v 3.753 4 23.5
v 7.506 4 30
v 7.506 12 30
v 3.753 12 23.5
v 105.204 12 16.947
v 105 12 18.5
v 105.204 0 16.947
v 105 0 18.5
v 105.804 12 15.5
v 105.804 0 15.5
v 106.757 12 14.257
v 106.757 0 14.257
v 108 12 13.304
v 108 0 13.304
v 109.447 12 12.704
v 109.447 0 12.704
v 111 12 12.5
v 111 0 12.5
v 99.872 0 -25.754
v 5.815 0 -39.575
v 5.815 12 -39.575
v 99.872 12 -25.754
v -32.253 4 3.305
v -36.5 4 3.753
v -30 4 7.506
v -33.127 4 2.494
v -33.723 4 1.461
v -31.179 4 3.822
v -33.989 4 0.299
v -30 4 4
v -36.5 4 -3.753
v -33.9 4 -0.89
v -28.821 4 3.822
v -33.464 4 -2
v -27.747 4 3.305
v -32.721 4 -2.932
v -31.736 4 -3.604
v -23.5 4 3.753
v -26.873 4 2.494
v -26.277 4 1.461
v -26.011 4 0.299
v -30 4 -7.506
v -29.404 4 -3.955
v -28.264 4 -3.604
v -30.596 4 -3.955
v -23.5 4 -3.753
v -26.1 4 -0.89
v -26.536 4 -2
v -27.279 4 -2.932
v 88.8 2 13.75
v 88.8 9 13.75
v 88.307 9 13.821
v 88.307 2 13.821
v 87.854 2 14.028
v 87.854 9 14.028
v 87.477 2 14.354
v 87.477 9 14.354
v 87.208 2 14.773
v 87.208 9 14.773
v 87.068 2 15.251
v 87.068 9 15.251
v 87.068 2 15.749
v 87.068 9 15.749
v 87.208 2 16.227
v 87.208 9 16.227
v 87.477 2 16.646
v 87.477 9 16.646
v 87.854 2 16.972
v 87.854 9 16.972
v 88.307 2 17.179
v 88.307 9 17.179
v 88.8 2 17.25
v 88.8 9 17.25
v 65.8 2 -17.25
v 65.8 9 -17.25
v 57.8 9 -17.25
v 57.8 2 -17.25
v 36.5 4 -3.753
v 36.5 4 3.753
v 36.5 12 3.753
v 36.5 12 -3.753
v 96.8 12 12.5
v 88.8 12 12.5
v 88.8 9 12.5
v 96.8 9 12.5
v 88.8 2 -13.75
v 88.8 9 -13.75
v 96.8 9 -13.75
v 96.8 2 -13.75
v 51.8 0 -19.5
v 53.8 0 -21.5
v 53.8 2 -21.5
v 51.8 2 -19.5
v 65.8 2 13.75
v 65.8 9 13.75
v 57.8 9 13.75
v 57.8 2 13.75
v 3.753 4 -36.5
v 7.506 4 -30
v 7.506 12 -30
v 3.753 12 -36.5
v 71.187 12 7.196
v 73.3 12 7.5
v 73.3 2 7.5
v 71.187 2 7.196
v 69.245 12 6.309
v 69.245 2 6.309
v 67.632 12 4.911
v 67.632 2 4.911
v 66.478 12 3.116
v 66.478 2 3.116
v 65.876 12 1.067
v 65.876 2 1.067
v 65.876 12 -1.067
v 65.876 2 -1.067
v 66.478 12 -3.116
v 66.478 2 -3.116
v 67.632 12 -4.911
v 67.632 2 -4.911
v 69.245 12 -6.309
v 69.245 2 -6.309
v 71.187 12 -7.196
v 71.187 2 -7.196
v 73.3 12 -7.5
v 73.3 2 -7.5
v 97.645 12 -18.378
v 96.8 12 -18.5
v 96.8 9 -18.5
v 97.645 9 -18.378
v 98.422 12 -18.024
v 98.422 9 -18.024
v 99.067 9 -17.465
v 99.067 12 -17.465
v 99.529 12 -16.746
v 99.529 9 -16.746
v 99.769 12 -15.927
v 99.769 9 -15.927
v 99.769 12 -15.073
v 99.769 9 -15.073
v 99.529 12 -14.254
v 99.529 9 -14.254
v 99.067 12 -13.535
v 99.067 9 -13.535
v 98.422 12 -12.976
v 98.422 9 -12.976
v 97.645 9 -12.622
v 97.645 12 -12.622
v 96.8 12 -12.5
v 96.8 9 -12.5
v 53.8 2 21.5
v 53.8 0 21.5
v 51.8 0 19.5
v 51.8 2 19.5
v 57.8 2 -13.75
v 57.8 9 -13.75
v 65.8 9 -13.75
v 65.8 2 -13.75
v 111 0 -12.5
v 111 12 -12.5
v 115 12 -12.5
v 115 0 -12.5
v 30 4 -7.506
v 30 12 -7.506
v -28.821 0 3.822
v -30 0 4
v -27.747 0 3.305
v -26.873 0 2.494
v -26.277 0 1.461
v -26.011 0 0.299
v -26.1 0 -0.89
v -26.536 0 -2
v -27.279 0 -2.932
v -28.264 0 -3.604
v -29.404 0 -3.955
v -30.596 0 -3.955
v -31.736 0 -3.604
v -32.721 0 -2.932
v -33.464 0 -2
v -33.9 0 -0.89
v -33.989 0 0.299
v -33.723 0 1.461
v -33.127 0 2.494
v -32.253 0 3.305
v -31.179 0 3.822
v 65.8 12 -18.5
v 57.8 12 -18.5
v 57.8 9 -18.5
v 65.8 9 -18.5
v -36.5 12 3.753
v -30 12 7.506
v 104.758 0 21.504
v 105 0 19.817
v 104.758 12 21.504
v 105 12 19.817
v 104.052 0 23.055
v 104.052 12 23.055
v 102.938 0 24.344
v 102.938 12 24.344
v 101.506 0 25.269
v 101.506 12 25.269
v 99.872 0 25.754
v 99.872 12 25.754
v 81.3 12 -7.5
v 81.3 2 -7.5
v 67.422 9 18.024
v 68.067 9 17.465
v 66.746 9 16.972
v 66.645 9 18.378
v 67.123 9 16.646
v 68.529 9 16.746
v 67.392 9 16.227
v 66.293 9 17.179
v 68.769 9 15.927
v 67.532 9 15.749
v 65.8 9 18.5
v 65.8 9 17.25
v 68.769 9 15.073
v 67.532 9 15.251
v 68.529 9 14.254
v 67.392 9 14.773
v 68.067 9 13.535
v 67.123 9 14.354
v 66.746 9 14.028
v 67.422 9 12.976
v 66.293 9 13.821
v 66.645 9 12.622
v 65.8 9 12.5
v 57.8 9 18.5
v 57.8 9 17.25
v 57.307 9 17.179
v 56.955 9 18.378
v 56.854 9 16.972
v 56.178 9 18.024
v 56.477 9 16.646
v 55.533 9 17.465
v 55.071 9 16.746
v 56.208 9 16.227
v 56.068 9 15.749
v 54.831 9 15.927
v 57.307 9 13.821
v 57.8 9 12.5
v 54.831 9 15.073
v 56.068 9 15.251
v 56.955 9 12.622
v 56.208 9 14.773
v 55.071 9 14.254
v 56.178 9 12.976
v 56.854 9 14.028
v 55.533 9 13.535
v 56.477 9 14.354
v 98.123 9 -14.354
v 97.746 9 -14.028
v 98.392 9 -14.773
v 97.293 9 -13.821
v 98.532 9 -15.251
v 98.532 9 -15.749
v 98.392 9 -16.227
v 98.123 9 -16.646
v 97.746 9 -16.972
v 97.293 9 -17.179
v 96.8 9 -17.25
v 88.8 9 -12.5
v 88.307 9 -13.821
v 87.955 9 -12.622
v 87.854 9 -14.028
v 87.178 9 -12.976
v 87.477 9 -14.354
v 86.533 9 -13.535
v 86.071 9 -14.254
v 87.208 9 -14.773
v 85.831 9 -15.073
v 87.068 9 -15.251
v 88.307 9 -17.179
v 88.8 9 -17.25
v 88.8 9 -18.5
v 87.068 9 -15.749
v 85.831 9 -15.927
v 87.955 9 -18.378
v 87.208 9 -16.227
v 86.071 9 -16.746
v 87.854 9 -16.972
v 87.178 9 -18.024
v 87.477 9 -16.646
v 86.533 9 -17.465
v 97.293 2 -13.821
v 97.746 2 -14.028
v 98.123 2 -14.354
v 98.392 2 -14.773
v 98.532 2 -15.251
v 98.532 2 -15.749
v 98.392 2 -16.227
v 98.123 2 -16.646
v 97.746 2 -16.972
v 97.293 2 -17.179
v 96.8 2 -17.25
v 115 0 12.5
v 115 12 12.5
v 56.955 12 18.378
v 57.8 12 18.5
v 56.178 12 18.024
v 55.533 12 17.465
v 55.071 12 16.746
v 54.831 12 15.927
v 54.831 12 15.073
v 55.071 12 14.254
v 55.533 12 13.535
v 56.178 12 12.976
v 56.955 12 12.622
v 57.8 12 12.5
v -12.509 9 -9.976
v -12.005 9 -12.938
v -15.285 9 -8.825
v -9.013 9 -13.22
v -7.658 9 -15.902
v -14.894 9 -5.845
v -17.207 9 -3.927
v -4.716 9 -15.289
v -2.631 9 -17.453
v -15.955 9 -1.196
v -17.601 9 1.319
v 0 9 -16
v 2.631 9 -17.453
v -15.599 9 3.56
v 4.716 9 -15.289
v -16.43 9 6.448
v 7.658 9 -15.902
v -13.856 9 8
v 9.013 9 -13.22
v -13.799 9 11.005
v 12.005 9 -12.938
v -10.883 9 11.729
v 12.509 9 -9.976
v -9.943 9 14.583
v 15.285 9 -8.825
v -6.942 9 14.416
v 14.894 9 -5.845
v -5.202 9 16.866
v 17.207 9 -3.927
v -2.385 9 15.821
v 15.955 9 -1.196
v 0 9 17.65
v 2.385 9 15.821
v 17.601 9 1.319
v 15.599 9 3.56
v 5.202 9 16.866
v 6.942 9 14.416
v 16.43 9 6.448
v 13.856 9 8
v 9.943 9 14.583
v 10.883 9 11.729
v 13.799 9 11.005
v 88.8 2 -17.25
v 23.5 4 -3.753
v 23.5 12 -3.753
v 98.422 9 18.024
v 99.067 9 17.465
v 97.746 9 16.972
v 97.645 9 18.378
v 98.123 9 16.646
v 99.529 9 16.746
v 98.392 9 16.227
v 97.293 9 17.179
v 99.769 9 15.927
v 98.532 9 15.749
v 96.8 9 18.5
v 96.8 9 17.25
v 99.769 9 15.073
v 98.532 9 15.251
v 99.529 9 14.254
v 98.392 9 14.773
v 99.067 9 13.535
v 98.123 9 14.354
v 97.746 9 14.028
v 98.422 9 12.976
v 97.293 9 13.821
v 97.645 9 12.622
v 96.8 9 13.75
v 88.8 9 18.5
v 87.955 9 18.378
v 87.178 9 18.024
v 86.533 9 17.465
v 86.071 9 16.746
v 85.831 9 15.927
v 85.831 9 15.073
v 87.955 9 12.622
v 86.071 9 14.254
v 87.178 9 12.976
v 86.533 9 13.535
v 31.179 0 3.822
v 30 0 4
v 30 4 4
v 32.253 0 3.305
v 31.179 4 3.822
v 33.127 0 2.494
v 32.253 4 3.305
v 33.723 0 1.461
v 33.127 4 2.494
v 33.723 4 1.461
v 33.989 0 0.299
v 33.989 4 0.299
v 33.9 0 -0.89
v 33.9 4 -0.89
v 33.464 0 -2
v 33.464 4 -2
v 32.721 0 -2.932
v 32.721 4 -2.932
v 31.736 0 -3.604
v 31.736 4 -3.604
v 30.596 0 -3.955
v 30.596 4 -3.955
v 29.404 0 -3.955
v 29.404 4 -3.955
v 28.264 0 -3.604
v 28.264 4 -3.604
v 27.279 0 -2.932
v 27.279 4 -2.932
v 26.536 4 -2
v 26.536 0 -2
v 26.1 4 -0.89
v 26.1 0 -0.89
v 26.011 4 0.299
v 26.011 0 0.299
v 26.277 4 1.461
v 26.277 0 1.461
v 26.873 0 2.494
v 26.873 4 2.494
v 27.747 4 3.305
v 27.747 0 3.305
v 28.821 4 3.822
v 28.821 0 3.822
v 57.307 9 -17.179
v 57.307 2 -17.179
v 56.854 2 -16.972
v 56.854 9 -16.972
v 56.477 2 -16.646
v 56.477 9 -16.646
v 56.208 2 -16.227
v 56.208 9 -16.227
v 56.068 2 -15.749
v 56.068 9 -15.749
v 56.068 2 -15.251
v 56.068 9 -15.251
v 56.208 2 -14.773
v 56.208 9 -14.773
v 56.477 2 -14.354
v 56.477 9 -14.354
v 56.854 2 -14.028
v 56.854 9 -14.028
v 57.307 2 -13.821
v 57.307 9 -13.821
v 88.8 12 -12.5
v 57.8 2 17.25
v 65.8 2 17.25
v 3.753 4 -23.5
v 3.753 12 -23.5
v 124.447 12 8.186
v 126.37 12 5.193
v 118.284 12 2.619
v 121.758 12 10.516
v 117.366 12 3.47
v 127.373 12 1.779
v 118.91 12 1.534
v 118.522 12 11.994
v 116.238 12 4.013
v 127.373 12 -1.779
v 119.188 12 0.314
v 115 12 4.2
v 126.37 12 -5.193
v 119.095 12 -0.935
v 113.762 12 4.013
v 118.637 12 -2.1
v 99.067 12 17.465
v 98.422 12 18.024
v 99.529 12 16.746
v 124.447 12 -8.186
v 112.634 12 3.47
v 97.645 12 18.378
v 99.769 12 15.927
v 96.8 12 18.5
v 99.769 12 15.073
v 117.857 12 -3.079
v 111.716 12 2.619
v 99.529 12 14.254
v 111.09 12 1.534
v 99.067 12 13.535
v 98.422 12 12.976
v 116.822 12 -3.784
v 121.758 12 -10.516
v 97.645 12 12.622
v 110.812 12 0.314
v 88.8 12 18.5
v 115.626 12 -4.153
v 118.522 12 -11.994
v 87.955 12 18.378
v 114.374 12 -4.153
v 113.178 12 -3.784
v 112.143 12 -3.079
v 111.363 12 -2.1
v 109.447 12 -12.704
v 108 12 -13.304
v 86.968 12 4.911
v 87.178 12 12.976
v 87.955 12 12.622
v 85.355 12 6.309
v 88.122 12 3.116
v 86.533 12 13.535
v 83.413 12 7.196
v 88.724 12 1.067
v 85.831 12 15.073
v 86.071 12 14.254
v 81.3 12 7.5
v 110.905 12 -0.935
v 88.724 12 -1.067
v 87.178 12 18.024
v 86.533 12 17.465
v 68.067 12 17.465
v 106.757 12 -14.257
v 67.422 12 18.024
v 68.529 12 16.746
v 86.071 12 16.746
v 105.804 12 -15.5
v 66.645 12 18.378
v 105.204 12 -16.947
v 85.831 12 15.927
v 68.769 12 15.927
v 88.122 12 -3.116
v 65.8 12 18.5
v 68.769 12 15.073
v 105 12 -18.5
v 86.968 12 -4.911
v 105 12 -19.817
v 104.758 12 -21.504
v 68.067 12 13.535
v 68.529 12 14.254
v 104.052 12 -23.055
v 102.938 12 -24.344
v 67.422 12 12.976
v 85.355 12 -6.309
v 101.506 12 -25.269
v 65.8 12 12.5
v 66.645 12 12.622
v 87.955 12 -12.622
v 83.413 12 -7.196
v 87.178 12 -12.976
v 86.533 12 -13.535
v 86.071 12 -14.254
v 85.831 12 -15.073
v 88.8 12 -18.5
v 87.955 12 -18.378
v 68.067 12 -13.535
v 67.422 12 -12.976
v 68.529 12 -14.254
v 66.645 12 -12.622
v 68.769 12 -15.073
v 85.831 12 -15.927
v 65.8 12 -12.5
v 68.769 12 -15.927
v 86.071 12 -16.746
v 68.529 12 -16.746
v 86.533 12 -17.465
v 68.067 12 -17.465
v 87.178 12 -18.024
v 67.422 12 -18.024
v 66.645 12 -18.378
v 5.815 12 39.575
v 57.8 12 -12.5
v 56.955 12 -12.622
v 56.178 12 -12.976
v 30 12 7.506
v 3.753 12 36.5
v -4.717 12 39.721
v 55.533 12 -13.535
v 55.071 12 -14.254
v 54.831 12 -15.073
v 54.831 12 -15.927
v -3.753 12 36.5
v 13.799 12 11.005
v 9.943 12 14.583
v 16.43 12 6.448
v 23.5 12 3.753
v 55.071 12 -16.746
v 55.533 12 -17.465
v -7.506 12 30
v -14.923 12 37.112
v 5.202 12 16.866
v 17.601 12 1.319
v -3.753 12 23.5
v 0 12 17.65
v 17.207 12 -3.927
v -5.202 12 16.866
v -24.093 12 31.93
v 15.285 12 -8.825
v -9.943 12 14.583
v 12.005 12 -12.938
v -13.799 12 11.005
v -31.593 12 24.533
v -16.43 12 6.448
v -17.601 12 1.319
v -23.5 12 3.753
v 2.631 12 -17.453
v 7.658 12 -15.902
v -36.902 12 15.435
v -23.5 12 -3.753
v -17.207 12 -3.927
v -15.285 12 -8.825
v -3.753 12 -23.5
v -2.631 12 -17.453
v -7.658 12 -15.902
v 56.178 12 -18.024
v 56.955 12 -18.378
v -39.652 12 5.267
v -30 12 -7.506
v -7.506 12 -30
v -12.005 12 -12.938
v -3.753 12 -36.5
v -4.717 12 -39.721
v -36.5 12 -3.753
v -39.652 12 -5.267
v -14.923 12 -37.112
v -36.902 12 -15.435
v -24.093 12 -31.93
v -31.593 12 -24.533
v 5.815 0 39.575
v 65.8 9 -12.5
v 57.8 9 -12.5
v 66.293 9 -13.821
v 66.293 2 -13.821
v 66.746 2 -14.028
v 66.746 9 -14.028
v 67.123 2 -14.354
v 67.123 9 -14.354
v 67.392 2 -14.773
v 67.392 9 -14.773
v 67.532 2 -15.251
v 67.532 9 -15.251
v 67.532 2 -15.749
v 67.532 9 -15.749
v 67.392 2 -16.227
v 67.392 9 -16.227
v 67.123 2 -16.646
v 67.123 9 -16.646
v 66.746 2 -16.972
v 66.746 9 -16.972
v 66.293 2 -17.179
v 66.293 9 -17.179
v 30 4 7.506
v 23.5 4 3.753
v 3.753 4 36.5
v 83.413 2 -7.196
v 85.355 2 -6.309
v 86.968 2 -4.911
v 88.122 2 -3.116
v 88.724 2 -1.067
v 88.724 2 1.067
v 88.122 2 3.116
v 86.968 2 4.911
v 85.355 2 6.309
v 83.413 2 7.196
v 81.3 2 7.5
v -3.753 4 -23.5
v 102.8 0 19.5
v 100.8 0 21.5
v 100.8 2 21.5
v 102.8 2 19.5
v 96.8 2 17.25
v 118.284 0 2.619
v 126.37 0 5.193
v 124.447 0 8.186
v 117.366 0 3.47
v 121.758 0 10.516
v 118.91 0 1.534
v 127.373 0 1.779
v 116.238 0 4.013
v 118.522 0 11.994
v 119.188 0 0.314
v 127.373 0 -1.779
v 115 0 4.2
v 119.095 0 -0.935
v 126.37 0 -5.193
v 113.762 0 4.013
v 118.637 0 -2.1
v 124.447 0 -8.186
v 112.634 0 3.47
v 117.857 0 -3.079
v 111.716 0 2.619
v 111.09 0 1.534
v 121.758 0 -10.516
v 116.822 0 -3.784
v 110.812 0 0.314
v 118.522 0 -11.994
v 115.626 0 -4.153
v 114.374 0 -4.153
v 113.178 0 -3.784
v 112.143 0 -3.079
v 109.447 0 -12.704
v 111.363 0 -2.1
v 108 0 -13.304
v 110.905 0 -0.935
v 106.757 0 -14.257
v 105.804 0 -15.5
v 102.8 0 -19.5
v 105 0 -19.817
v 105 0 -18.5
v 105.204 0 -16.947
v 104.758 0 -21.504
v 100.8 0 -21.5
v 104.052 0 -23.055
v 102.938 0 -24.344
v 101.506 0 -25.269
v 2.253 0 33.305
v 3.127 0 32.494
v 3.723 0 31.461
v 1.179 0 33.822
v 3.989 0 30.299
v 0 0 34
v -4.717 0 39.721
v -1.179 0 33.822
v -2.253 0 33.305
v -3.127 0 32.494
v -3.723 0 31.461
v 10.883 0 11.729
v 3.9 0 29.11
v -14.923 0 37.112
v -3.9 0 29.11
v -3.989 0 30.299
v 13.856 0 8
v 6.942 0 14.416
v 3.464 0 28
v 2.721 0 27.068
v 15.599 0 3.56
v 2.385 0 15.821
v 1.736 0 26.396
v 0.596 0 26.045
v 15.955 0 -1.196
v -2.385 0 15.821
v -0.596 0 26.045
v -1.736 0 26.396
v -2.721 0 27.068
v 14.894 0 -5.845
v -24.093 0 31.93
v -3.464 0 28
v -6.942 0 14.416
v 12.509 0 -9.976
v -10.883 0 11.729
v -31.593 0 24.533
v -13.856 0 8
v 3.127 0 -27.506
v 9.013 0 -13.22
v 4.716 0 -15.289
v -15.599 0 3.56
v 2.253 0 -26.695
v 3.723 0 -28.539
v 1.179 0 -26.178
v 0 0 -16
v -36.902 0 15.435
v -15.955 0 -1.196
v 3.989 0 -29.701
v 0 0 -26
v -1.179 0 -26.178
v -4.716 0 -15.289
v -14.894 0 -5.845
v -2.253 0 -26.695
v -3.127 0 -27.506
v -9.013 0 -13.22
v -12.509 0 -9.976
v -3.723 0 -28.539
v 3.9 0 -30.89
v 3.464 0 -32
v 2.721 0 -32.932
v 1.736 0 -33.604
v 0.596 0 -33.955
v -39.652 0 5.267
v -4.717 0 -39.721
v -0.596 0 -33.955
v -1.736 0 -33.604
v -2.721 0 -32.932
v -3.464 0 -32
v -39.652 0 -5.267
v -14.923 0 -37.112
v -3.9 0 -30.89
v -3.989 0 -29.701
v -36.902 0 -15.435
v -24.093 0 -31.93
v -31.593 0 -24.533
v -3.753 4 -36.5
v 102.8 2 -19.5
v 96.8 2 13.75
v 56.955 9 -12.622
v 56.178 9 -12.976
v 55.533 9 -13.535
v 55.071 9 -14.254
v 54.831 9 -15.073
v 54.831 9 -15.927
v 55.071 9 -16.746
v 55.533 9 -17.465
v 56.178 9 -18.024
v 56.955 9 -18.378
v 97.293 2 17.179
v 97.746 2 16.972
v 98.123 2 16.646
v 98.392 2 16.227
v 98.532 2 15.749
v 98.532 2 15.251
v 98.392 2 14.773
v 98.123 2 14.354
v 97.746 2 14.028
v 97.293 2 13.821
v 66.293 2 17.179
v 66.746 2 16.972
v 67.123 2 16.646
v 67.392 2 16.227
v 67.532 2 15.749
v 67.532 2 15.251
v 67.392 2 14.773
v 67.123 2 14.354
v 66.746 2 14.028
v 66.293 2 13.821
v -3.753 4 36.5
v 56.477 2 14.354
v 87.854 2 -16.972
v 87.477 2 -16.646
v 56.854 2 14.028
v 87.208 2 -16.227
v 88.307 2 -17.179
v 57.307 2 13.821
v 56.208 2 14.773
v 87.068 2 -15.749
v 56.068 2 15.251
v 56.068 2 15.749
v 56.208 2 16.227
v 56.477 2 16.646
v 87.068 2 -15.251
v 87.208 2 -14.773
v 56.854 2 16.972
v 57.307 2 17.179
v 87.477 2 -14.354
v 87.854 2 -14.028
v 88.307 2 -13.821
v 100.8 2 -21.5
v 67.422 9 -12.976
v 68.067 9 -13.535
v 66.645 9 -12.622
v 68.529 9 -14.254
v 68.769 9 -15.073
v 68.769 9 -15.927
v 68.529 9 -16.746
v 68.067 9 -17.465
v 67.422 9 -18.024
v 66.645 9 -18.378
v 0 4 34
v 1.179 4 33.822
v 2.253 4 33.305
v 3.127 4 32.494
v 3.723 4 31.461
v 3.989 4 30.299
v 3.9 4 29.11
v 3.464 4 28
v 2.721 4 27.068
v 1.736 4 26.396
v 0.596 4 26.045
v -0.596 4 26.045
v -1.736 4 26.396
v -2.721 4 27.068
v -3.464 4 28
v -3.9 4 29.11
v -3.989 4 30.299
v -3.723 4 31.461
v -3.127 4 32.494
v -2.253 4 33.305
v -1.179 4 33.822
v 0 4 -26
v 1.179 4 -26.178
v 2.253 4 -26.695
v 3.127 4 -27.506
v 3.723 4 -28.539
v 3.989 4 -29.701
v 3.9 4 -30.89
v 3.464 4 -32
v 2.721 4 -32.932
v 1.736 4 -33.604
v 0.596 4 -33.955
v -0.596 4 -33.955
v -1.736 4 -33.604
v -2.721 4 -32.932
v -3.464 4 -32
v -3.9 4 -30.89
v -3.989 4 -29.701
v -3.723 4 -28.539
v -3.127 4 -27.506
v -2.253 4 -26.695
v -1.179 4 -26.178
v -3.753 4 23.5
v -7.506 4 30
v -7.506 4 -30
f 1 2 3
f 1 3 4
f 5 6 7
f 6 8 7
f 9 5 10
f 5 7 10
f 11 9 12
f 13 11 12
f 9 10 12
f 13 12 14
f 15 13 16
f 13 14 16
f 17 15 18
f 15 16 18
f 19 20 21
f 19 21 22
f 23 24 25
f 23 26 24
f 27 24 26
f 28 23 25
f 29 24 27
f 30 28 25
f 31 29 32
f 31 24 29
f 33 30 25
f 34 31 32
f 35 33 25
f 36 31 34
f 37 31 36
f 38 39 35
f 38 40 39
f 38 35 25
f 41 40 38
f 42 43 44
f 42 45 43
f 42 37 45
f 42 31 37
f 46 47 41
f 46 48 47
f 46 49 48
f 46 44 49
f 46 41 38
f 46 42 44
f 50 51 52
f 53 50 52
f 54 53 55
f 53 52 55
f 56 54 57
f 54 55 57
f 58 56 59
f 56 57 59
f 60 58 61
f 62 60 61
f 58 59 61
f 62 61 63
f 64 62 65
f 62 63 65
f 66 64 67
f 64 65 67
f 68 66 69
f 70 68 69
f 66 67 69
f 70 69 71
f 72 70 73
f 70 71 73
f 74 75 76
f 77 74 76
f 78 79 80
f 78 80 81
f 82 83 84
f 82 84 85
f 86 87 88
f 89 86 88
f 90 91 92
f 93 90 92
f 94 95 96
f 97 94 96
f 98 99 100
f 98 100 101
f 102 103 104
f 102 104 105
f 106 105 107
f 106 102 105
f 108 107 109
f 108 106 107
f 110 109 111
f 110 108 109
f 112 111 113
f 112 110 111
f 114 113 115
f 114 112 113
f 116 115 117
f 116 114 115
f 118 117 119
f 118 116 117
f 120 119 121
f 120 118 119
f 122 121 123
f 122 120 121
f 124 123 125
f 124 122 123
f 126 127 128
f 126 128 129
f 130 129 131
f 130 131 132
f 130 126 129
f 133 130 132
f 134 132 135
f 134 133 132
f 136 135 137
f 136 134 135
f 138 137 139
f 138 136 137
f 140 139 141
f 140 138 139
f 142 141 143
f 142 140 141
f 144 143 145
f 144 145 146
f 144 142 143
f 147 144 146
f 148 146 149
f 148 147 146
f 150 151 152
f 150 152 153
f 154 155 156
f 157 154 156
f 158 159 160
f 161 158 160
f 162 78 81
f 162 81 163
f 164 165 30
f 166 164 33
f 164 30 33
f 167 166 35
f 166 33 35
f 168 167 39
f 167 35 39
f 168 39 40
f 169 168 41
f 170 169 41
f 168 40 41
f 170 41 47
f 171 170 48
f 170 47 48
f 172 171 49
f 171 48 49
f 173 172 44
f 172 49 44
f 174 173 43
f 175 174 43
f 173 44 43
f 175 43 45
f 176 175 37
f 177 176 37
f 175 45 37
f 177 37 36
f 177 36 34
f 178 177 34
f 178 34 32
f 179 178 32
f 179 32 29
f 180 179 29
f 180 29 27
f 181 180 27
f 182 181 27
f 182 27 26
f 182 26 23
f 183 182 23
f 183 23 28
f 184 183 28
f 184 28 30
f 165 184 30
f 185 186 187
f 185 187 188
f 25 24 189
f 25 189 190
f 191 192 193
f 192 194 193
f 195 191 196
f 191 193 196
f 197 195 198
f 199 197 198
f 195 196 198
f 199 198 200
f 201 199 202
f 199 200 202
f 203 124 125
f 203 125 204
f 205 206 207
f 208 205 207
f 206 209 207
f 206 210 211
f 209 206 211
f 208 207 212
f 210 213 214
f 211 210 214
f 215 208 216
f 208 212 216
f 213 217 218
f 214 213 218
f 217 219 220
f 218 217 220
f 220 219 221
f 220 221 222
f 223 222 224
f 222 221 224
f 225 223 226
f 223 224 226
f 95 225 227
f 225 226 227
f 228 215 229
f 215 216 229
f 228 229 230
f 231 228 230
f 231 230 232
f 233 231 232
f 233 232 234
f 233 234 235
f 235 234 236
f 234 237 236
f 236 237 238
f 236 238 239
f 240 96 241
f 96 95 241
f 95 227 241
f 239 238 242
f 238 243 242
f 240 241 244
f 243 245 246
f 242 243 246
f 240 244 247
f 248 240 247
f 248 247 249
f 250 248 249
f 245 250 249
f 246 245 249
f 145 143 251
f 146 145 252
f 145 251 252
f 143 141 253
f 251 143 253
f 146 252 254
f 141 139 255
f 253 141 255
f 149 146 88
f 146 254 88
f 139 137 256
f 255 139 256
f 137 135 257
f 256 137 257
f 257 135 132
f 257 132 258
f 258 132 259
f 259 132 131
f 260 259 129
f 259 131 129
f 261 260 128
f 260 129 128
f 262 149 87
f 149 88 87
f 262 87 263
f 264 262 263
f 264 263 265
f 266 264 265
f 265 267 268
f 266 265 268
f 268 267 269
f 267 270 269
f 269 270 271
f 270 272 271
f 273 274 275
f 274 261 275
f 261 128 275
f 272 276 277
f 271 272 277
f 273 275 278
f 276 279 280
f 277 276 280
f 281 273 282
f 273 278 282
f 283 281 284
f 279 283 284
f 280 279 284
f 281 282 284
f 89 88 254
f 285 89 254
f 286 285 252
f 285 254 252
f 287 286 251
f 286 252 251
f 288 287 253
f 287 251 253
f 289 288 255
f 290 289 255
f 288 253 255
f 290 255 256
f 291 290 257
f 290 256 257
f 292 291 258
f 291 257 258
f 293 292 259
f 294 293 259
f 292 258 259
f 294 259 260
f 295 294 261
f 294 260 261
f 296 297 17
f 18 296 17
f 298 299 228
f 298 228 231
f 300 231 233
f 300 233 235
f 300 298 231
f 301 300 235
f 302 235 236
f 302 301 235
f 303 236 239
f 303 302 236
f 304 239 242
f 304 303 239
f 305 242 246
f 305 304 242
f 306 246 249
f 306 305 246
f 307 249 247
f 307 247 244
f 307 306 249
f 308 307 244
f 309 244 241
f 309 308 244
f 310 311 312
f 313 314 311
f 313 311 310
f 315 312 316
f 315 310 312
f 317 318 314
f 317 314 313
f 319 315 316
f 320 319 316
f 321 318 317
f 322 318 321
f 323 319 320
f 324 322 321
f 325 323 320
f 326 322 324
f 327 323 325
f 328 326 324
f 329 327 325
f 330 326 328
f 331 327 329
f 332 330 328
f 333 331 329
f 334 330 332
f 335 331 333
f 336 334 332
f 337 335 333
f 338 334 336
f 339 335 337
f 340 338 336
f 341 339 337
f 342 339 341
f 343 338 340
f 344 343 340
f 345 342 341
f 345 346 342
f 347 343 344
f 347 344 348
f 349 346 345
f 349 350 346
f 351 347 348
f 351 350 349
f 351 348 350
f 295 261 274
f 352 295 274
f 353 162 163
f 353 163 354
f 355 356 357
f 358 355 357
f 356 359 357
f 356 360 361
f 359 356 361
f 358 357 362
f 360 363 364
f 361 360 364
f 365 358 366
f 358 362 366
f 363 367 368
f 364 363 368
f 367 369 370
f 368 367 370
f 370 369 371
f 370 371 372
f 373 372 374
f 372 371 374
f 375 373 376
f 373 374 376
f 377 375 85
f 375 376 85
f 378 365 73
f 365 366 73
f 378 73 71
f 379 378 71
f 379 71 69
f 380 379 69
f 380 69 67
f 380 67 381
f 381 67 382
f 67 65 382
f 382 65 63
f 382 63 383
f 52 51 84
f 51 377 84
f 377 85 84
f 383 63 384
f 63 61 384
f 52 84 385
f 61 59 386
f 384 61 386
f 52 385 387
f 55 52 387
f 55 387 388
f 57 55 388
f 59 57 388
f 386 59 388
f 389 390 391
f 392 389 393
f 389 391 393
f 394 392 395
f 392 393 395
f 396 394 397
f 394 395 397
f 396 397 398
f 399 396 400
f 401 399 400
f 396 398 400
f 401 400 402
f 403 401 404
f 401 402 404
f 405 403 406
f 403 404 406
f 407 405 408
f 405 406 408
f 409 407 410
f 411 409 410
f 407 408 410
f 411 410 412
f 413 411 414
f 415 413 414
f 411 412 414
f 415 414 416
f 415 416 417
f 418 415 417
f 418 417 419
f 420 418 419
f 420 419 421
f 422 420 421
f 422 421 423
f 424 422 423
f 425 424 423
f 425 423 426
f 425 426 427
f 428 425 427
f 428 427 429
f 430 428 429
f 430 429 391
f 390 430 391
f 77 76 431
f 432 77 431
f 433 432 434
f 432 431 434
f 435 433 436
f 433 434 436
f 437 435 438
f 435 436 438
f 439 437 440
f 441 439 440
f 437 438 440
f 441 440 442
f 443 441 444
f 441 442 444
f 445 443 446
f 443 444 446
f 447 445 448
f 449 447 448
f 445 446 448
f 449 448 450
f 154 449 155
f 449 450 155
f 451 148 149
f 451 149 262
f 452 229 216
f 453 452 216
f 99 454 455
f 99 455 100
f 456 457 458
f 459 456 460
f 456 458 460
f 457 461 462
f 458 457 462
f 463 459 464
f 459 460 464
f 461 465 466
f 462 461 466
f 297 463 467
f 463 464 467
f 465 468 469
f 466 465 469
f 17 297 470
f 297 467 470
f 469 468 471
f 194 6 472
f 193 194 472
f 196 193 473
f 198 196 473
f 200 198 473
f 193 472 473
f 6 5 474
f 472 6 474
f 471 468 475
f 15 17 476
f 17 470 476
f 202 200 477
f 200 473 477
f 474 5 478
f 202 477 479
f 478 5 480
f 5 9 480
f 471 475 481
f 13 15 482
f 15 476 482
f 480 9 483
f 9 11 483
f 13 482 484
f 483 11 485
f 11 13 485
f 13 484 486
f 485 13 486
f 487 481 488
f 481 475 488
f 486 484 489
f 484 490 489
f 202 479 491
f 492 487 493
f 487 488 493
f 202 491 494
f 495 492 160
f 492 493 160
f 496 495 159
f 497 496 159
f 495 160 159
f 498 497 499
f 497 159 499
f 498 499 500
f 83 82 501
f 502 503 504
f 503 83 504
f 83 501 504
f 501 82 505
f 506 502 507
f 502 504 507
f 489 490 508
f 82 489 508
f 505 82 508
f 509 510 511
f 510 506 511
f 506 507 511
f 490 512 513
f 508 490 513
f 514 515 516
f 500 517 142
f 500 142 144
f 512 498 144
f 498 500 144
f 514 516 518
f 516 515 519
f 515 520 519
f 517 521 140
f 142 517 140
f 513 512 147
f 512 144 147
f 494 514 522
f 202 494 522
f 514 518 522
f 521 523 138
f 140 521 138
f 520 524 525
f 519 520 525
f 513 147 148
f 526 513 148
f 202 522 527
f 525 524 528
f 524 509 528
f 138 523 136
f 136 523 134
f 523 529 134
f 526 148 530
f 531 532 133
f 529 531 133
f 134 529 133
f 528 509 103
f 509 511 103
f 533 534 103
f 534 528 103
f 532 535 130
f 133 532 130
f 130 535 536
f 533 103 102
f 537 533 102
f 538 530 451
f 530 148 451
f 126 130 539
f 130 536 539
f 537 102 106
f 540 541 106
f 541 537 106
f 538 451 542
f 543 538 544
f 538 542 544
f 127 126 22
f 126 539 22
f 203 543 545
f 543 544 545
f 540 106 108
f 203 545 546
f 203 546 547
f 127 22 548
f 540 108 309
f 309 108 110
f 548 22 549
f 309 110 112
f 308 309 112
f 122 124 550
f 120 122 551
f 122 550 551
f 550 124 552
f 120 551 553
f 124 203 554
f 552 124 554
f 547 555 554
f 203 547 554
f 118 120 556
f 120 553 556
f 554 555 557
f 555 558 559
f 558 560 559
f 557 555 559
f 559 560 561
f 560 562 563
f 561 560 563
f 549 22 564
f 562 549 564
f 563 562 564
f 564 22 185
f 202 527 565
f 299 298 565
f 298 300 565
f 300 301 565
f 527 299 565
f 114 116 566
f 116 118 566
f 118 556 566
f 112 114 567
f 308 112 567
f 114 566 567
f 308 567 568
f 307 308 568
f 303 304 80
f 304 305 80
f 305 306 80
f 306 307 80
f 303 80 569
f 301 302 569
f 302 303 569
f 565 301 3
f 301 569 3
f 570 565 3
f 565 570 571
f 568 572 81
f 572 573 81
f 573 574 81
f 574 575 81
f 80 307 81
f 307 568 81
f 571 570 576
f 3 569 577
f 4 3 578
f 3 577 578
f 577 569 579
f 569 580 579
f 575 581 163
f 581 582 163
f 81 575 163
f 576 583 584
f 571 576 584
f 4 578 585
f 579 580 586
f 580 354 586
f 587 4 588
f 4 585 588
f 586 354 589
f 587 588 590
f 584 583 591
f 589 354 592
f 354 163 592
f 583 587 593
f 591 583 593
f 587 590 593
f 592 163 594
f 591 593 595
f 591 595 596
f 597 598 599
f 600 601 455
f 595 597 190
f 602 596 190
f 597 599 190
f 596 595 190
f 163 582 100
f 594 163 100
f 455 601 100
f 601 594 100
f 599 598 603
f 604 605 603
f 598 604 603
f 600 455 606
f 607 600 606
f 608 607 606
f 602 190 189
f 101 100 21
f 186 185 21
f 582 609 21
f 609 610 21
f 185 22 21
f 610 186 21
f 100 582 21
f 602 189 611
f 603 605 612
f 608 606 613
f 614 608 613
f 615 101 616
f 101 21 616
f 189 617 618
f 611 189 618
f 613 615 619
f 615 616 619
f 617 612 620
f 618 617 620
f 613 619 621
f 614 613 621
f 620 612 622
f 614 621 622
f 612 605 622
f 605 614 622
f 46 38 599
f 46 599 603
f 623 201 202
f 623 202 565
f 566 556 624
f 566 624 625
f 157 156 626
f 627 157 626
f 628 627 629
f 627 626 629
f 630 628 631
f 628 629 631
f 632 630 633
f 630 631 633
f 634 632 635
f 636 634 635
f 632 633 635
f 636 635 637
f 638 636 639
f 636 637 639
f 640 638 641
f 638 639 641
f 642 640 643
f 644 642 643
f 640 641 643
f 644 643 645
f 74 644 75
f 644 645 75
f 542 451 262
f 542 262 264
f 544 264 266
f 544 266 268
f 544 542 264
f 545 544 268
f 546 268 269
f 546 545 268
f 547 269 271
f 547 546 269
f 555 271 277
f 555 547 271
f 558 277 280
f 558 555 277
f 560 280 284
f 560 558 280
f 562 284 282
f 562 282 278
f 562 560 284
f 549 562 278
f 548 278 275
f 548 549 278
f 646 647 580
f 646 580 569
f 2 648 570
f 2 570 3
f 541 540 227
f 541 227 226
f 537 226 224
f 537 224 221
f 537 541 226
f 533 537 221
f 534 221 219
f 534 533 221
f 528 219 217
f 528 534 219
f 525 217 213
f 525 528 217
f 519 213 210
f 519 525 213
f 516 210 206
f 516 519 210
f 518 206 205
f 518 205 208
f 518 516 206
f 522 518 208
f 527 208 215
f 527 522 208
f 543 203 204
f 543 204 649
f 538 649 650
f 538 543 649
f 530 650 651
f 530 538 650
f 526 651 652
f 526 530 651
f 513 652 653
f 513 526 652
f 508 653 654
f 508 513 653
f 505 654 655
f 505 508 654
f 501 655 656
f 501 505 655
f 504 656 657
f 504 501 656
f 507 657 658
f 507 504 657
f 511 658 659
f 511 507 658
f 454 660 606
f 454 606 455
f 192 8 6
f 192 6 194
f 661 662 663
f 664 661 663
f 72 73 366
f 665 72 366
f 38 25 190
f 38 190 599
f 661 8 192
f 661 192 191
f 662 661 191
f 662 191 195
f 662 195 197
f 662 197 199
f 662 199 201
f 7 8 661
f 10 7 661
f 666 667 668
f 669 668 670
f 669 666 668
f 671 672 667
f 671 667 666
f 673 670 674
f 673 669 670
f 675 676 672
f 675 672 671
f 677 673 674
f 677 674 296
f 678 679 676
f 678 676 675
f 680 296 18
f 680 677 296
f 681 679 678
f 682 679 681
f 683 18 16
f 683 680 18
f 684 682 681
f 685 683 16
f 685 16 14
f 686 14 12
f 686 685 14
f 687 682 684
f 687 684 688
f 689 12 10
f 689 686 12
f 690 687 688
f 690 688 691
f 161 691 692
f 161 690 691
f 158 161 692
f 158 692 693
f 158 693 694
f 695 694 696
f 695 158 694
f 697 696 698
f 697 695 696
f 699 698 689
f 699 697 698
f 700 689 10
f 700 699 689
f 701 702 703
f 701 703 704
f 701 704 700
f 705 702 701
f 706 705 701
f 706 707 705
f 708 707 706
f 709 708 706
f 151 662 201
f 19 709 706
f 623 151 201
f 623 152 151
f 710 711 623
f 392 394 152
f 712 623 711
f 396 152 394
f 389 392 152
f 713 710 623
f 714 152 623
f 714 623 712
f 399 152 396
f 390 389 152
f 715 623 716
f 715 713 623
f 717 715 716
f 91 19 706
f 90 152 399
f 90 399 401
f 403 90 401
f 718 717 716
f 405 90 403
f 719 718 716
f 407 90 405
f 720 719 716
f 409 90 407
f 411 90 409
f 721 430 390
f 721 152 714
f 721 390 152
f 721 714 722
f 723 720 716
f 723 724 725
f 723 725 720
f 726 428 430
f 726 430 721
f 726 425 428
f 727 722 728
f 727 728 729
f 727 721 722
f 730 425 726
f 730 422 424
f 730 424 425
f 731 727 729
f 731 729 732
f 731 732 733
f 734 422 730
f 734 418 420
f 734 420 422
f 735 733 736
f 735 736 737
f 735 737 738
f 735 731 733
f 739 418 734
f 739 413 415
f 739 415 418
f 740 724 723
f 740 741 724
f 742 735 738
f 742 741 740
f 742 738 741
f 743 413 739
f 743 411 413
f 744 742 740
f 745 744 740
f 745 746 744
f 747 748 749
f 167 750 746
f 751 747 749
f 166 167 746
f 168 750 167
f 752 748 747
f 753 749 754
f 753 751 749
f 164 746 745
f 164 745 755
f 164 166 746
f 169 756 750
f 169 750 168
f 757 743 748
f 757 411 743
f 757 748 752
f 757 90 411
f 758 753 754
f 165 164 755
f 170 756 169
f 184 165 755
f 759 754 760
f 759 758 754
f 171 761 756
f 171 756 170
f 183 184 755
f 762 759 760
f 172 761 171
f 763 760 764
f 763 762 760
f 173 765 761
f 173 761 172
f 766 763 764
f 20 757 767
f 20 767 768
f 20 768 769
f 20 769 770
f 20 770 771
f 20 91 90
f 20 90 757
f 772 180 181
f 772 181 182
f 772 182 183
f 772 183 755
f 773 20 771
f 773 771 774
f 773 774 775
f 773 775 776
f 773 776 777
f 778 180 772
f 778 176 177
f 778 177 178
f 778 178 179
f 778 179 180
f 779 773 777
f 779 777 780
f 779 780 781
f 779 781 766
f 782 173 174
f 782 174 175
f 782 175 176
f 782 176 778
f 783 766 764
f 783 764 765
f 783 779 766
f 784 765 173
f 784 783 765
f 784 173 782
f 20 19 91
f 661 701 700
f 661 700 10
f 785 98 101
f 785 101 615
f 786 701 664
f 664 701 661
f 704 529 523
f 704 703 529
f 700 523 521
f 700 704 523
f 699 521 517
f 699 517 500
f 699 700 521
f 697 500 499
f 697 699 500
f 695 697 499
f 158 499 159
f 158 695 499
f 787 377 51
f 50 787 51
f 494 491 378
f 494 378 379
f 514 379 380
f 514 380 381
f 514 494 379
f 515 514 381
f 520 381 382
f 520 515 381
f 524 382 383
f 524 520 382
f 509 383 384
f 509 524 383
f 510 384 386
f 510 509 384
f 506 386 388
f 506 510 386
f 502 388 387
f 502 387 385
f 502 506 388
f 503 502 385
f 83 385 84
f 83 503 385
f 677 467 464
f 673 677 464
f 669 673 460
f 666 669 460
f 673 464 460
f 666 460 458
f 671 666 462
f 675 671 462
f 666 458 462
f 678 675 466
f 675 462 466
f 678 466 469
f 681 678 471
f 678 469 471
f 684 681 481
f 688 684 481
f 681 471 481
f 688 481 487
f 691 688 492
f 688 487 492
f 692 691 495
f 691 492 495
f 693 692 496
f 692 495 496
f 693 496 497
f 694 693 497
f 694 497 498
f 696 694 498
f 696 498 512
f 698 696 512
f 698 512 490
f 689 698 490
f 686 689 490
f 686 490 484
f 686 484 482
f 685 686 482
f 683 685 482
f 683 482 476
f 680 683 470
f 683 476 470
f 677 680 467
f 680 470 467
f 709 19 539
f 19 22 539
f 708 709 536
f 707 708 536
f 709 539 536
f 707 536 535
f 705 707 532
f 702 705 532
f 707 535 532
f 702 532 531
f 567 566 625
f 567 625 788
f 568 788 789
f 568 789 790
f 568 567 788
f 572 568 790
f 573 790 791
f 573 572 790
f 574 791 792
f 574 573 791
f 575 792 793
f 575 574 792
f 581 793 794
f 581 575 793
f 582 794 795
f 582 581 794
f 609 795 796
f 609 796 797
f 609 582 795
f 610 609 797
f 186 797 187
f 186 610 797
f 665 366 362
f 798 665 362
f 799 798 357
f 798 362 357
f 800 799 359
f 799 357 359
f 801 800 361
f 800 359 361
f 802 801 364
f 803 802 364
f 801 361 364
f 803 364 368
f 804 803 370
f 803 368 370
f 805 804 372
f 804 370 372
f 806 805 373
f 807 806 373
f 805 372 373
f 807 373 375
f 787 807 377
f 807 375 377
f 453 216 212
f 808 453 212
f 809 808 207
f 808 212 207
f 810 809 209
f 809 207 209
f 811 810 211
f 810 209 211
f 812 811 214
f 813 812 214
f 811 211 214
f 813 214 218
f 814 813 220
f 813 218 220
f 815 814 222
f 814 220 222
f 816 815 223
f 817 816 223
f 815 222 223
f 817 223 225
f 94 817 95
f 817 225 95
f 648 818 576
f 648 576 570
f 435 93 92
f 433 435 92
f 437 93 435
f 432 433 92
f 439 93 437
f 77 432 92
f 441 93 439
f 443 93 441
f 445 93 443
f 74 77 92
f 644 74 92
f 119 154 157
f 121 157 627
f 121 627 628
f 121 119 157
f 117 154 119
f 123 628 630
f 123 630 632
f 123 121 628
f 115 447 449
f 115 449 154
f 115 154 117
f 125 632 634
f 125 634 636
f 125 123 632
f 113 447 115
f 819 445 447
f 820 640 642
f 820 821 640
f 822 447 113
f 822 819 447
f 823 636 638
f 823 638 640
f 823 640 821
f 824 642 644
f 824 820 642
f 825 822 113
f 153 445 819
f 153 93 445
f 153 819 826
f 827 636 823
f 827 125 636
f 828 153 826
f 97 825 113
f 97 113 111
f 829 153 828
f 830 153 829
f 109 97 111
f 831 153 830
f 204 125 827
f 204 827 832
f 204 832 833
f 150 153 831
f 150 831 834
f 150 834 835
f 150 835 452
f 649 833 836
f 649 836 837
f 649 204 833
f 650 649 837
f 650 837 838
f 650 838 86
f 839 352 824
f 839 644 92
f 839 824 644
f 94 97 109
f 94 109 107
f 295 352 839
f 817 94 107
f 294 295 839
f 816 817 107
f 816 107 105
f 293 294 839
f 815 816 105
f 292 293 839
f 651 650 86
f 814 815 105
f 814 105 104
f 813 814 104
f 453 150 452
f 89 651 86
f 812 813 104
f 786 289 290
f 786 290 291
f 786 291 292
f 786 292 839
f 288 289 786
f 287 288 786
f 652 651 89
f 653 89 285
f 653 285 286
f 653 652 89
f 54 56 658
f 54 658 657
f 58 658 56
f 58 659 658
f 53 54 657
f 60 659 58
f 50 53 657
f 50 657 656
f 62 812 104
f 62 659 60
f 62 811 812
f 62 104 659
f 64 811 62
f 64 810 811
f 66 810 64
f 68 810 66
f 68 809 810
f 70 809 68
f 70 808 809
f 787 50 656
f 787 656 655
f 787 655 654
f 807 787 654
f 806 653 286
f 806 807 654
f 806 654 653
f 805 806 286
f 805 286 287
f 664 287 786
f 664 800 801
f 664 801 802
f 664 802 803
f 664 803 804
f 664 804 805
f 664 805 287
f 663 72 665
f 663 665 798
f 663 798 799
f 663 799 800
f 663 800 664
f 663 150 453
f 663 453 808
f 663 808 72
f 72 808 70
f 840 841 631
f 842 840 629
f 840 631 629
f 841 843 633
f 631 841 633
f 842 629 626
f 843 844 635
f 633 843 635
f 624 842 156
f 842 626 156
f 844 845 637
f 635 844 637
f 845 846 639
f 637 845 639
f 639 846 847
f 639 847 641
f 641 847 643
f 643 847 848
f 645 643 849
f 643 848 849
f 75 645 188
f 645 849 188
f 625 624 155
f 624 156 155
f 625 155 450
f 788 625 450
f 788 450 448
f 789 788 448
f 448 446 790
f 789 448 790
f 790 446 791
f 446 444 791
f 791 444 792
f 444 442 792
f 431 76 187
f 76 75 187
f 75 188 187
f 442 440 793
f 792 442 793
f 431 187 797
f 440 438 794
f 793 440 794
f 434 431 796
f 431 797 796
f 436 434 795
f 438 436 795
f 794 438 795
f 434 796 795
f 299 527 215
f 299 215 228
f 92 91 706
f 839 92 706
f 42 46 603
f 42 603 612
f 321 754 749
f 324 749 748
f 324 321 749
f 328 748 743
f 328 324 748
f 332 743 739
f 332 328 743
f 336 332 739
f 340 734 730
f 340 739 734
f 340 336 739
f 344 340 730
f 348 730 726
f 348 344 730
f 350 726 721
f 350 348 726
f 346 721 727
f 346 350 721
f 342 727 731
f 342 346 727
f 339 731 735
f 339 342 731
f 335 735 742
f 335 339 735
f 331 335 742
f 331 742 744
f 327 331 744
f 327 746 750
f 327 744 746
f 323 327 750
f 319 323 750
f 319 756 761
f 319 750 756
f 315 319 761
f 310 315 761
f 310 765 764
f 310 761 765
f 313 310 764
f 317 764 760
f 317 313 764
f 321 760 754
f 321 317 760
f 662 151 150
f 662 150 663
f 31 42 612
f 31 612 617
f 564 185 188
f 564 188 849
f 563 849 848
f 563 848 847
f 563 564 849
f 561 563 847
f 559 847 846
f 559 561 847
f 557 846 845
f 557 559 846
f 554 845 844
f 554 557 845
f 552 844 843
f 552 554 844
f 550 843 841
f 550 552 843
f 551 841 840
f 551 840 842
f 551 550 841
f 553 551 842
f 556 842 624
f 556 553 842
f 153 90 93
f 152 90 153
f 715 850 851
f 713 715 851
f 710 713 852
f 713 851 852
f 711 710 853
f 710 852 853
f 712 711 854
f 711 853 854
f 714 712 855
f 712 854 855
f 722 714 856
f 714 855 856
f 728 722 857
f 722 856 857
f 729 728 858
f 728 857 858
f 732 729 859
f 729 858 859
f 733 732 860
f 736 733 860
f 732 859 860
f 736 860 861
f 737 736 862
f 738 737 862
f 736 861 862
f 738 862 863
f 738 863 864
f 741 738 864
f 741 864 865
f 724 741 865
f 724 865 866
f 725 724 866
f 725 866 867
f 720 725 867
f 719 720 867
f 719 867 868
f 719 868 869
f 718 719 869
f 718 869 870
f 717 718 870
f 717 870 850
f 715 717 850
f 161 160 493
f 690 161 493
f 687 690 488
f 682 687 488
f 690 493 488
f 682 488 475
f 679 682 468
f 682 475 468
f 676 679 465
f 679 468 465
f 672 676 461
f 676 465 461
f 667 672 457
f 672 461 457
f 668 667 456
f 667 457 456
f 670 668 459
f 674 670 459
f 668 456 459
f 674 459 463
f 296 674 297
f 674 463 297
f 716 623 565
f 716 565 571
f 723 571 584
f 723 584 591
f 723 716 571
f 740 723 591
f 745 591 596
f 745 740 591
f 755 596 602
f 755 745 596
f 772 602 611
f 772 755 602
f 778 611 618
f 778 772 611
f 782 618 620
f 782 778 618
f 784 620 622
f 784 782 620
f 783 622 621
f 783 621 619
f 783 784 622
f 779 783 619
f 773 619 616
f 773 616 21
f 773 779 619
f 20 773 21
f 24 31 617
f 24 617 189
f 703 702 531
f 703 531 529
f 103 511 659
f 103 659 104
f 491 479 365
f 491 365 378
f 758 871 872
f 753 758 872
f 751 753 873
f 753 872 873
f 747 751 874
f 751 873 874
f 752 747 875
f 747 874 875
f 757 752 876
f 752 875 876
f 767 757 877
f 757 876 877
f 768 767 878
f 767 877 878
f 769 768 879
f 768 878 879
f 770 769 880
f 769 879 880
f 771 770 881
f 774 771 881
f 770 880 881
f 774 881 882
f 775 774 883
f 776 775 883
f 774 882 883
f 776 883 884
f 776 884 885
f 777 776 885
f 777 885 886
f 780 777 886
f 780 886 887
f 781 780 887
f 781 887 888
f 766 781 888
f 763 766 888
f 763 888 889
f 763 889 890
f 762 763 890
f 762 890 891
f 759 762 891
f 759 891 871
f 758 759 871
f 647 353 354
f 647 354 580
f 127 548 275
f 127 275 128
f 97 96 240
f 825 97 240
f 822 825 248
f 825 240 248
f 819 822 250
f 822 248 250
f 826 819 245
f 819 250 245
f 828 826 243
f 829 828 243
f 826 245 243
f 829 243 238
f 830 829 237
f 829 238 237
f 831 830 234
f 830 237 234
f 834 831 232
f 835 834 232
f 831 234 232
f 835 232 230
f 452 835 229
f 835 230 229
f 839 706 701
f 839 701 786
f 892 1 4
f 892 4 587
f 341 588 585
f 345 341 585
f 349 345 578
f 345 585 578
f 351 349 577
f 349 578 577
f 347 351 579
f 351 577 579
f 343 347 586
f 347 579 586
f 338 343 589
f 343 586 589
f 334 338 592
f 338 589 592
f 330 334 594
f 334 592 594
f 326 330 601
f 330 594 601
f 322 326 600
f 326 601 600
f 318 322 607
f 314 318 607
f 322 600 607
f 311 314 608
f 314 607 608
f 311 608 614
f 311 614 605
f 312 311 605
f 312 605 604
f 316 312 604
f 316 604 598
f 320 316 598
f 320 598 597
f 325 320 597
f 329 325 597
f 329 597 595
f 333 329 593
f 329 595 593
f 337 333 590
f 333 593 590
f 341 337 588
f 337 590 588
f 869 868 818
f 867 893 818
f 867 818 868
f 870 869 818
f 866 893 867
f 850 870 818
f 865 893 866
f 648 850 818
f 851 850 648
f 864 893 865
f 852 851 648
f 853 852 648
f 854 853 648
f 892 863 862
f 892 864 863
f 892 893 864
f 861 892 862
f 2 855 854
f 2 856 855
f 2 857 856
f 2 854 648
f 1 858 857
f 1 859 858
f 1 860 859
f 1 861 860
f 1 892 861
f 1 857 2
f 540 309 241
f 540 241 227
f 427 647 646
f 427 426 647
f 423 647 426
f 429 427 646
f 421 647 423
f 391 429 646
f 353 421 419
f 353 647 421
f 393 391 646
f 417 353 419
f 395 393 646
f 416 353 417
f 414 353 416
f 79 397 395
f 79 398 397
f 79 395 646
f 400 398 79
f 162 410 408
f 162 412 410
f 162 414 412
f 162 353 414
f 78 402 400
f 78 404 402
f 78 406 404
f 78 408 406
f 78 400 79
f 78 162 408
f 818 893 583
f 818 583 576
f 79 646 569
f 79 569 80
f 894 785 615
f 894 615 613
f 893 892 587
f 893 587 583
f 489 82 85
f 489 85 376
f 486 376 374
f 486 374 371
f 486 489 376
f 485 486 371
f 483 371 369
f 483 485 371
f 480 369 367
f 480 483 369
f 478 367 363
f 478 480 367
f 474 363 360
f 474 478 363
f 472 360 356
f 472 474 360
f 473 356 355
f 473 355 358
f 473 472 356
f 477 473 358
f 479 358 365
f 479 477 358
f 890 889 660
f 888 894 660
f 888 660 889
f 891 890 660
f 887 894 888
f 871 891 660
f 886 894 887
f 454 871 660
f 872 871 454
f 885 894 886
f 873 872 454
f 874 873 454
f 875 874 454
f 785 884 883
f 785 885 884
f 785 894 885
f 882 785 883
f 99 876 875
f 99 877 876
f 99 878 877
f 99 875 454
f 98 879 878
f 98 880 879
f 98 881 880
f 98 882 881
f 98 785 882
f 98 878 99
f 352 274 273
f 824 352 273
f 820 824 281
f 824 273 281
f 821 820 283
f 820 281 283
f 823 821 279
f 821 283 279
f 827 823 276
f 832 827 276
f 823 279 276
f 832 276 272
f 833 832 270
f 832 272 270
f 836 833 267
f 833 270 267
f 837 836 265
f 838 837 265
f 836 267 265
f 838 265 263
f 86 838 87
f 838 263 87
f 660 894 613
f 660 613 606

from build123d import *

# Parameters (mm, degrees)
SKETCH1_R           = 10
BOSS_EXTRUDE1_DEPTH = 12
SKETCH2_R           = 17.65
CUT_EXTRUDE1_DEPTH  = 3
CUT_EXTRUDE2_DEPTH  = 12
SKETCH4_R           = 4
CUT_EXTRUDE3_DEPTH  = 12
SKETCH5_R           = 16
CUT_EXTRUDE4_DEPTH  = 113.720894248
SKETCH6_W           = 51
SKETCH6_H           = 43
CUT_EXTRUDE5_DEPTH  = 2
CHAMFER1_SIZE       = 2
CUT_EXTRUDE6_DEPTH  = 8
CUT_EXTRUDE7_DEPTH  = 3
CUT_EXTRUDE8_DEPTH  = 7
SKETCH11_R          = 4.2
BOSS_EXTRUDE2_DEPTH = 12
FILLET1_R           = 6


with BuildPart() as part:
    # Sketch1 → Boss-Extrude1 (new body)
    with BuildSketch(Plane(origin=(0, 0, 0), x_dir=(1, 0, 0), z_dir=(0, 1, 0))):
        with BuildLine():
            Line((5.815477401, 39.574994916), (105, 25))
            Line((105, 25), (105, -25))
            Line((105, -25), (5.815477401, -39.574994916))
            ThreePointArc((5.815477401, -39.574994916), (-40, 0), (5.815477401, 39.574994916))
        make_face()
        with Locations(Location((0, 0, 0), (0, 0, 270))):
            Circle(SKETCH1_R, mode=Mode.SUBTRACT)
    extrude(amount=BOSS_EXTRUDE1_DEPTH)

    # Sketch2 → Cut-Extrude1 (cut)
    with BuildSketch(Plane(origin=(0, 12, 0), x_dir=(1, 0, 0), z_dir=(0, 1, 0))):
        with Locations(Location((0, 0, 0), (0, 0, 270))):
            Circle(SKETCH2_R)
    extrude(amount=-CUT_EXTRUDE1_DEPTH, mode=Mode.SUBTRACT)

    # Sketch3 → Cut-Extrude2 (cut)
    with BuildSketch(Plane(origin=(0, 12, 0), x_dir=(1, 0, 0), z_dir=(0, 1, 0))):
        with BuildLine():
            Line((73.3, 7.5), (81.3, 7.5))
            ThreePointArc((81.3, 7.5), (88.8, 0), (81.3, -7.5))
            Line((81.3, -7.5), (73.3, -7.5))
            ThreePointArc((73.3, -7.5), (65.8, 0), (73.3, 7.5))
        make_face()
    extrude(amount=-CUT_EXTRUDE2_DEPTH, mode=Mode.SUBTRACT)

    # Sketch4 → Cut-Extrude3 (cut)
    with BuildSketch(Plane(origin=(0, 12, 0), x_dir=(1, 0, 0), z_dir=(0, 1, 0))):
        with Locations(Location((30, 0, 0), (0, 0, 270))):
            Circle(SKETCH4_R)
        with Locations(Location((0, -30, 0), (0, 0, 270))):
            Circle(SKETCH4_R)
        with Locations(Location((-30, 0, 0), (0, 0, 270))):
            Circle(SKETCH4_R)
        with Locations(Location((0, 30, 0), (0, 0, 270))):
            Circle(SKETCH4_R)
    extrude(amount=-CUT_EXTRUDE3_DEPTH, mode=Mode.SUBTRACT)

    # Sketch5 → Cut-Extrude4 (cut, through all)
    with BuildSketch(Plane.XZ.offset(-9)):
        with Locations(Location((0, 0, 0), (0, 0, 270))):
            Circle(SKETCH5_R)
    extrude(amount=CUT_EXTRUDE4_DEPTH, mode=Mode.SUBTRACT)

    # Sketch6 → Cut-Extrude5 (cut)
    with BuildSketch(Plane.XZ):
        with Locations((77.3, 0)):
            Rectangle(SKETCH6_W, SKETCH6_H)
    extrude(amount=-CUT_EXTRUDE5_DEPTH, mode=Mode.SUBTRACT)

    # Chamfer1
    chamfer1_edges = [part.edges().sort_by_distance(p)[0] for p in [
        (102.8, 1, 21.5),
        (102.8, 1, -21.5),
        (51.8, 1, -21.5),
        (51.8, 1, 21.5),
    ]]
    chamfer(chamfer1_edges, length=CHAMFER1_SIZE)

    # Sketch7 → Cut-Extrude6 (cut)
    with BuildSketch(Plane(origin=(0, 12, 0), x_dir=(1, 0, 0), z_dir=(0, 1, 0))):
        Polygon((-7.505553499, 30), (-3.75277675, 23.5), (3.75277675, 23.5), (7.505553499, 30), (3.75277675, 36.5), (-3.75277675, 36.5), align=None)
        Polygon((-30, -7.505553499), (-23.5, -3.75277675), (-23.5, 3.75277675), (-30, 7.505553499), (-36.5, 3.75277675), (-36.5, -3.75277675), align=None)
        Polygon((30, 7.505553499), (23.5, 3.75277675), (23.5, -3.75277675), (30, -7.505553499), (36.5, -3.75277675), (36.5, 3.75277675), align=None)
        Polygon((7.505553499, -30), (3.75277675, -23.5), (-3.75277675, -23.5), (-7.505553499, -30), (-3.75277675, -36.5), (3.75277675, -36.5), align=None)
    extrude(amount=-CUT_EXTRUDE6_DEPTH, mode=Mode.SUBTRACT)

    # Sketch9 → Cut-Extrude7 (cut)
    with BuildSketch(Plane(origin=(0, 12, 0), x_dir=(1, 0, 0), z_dir=(0, 1, 0))):
        with BuildLine():
            Line((57.8, 18.5), (65.8, 18.5))
            ThreePointArc((65.8, 18.5), (68.8, 15.5), (65.8, 12.5))
            Line((65.8, 12.5), (57.8, 12.5))
            ThreePointArc((57.8, 12.5), (54.8, 15.5), (57.8, 18.5))
        make_face()
        with BuildLine():
            Line((88.8, 18.5), (96.8, 18.5))
            ThreePointArc((96.8, 18.5), (99.8, 15.5), (96.8, 12.5))
            Line((96.8, 12.5), (88.8, 12.5))
            ThreePointArc((88.8, 12.5), (85.8, 15.5), (88.8, 18.5))
        make_face()
        with BuildLine():
            Line((57.8, -12.5), (65.8, -12.5))
            ThreePointArc((65.8, -12.5), (68.8, -15.5), (65.8, -18.5))
            Line((65.8, -18.5), (57.8, -18.5))
            ThreePointArc((57.8, -18.5), (54.8, -15.5), (57.8, -12.5))
        make_face()
        with BuildLine():
            Line((88.8, -12.5), (96.8, -12.5))
            ThreePointArc((96.8, -12.5), (99.8, -15.5), (96.8, -18.5))
            Line((96.8, -18.5), (88.8, -18.5))
            ThreePointArc((88.8, -18.5), (85.8, -15.5), (88.8, -12.5))
        make_face()
    extrude(amount=-CUT_EXTRUDE7_DEPTH, mode=Mode.SUBTRACT)

    # Sketch10 → Cut-Extrude8 (cut)
    with BuildSketch(Plane(origin=(0, 9, 0), x_dir=(1, 0, 0), z_dir=(0, 1, 0))):
        with BuildLine():
            Line((57.8, 13.75), (65.8, 13.75))
            ThreePointArc((65.8, 13.75), (67.55, 15.5), (65.8, 17.25))
            Line((65.8, 17.25), (57.8, 17.25))
            ThreePointArc((57.8, 17.25), (56.05, 15.5), (57.8, 13.75))
        make_face()
        with BuildLine():
            Line((88.8, 13.75), (96.8, 13.75))
            ThreePointArc((96.8, 13.75), (98.55, 15.5), (96.8, 17.25))
            Line((96.8, 17.25), (88.8, 17.25))
            ThreePointArc((88.8, 17.25), (87.05, 15.5), (88.8, 13.75))
        make_face()
        with BuildLine():
            Line((57.8, -17.25), (65.8, -17.25))
            ThreePointArc((65.8, -17.25), (67.55, -15.5), (65.8, -13.75))
            Line((65.8, -13.75), (57.8, -13.75))
            ThreePointArc((57.8, -13.75), (56.05, -15.5), (57.8, -17.25))
        make_face()
        with BuildLine():
            Line((88.8, -17.25), (96.8, -17.25))
            ThreePointArc((96.8, -17.25), (98.55, -15.5), (96.8, -13.75))
            Line((96.8, -13.75), (88.8, -13.75))
            ThreePointArc((88.8, -13.75), (87.05, -15.5), (88.8, -17.25))
        make_face()
    extrude(amount=-CUT_EXTRUDE8_DEPTH, mode=Mode.SUBTRACT)

    # Sketch11 → Boss-Extrude2 (add)
    with BuildSketch(Plane(origin=(0, 12, 0), x_dir=(1, 0, 0), z_dir=(0, 1, 0))):
        with BuildLine():
            Line((105, -12.5), (105, 12.5))
            Line((105, 12.5), (115, 12.5))
            ThreePointArc((115, 12.5), (127.5, 0), (115, -12.5))
            Line((115, -12.5), (105, -12.5))
        make_face()
        with Locations(Location((115, 0, 0), (0, 0, 270))):
            Circle(SKETCH11_R, mode=Mode.SUBTRACT)
    extrude(amount=-BOSS_EXTRUDE2_DEPTH)

    # Fillet1
    fillet1_edges = [part.edges().sort_by_distance(p)[0] for p in [
        (105, 6, -12.5),
        (105, 6, 12.5),
        (105, 6, -25),
        (105, 6, 25),
    ]]
    fillet(fillet1_edges, radius=FILLET1_R)


solid = part.part
